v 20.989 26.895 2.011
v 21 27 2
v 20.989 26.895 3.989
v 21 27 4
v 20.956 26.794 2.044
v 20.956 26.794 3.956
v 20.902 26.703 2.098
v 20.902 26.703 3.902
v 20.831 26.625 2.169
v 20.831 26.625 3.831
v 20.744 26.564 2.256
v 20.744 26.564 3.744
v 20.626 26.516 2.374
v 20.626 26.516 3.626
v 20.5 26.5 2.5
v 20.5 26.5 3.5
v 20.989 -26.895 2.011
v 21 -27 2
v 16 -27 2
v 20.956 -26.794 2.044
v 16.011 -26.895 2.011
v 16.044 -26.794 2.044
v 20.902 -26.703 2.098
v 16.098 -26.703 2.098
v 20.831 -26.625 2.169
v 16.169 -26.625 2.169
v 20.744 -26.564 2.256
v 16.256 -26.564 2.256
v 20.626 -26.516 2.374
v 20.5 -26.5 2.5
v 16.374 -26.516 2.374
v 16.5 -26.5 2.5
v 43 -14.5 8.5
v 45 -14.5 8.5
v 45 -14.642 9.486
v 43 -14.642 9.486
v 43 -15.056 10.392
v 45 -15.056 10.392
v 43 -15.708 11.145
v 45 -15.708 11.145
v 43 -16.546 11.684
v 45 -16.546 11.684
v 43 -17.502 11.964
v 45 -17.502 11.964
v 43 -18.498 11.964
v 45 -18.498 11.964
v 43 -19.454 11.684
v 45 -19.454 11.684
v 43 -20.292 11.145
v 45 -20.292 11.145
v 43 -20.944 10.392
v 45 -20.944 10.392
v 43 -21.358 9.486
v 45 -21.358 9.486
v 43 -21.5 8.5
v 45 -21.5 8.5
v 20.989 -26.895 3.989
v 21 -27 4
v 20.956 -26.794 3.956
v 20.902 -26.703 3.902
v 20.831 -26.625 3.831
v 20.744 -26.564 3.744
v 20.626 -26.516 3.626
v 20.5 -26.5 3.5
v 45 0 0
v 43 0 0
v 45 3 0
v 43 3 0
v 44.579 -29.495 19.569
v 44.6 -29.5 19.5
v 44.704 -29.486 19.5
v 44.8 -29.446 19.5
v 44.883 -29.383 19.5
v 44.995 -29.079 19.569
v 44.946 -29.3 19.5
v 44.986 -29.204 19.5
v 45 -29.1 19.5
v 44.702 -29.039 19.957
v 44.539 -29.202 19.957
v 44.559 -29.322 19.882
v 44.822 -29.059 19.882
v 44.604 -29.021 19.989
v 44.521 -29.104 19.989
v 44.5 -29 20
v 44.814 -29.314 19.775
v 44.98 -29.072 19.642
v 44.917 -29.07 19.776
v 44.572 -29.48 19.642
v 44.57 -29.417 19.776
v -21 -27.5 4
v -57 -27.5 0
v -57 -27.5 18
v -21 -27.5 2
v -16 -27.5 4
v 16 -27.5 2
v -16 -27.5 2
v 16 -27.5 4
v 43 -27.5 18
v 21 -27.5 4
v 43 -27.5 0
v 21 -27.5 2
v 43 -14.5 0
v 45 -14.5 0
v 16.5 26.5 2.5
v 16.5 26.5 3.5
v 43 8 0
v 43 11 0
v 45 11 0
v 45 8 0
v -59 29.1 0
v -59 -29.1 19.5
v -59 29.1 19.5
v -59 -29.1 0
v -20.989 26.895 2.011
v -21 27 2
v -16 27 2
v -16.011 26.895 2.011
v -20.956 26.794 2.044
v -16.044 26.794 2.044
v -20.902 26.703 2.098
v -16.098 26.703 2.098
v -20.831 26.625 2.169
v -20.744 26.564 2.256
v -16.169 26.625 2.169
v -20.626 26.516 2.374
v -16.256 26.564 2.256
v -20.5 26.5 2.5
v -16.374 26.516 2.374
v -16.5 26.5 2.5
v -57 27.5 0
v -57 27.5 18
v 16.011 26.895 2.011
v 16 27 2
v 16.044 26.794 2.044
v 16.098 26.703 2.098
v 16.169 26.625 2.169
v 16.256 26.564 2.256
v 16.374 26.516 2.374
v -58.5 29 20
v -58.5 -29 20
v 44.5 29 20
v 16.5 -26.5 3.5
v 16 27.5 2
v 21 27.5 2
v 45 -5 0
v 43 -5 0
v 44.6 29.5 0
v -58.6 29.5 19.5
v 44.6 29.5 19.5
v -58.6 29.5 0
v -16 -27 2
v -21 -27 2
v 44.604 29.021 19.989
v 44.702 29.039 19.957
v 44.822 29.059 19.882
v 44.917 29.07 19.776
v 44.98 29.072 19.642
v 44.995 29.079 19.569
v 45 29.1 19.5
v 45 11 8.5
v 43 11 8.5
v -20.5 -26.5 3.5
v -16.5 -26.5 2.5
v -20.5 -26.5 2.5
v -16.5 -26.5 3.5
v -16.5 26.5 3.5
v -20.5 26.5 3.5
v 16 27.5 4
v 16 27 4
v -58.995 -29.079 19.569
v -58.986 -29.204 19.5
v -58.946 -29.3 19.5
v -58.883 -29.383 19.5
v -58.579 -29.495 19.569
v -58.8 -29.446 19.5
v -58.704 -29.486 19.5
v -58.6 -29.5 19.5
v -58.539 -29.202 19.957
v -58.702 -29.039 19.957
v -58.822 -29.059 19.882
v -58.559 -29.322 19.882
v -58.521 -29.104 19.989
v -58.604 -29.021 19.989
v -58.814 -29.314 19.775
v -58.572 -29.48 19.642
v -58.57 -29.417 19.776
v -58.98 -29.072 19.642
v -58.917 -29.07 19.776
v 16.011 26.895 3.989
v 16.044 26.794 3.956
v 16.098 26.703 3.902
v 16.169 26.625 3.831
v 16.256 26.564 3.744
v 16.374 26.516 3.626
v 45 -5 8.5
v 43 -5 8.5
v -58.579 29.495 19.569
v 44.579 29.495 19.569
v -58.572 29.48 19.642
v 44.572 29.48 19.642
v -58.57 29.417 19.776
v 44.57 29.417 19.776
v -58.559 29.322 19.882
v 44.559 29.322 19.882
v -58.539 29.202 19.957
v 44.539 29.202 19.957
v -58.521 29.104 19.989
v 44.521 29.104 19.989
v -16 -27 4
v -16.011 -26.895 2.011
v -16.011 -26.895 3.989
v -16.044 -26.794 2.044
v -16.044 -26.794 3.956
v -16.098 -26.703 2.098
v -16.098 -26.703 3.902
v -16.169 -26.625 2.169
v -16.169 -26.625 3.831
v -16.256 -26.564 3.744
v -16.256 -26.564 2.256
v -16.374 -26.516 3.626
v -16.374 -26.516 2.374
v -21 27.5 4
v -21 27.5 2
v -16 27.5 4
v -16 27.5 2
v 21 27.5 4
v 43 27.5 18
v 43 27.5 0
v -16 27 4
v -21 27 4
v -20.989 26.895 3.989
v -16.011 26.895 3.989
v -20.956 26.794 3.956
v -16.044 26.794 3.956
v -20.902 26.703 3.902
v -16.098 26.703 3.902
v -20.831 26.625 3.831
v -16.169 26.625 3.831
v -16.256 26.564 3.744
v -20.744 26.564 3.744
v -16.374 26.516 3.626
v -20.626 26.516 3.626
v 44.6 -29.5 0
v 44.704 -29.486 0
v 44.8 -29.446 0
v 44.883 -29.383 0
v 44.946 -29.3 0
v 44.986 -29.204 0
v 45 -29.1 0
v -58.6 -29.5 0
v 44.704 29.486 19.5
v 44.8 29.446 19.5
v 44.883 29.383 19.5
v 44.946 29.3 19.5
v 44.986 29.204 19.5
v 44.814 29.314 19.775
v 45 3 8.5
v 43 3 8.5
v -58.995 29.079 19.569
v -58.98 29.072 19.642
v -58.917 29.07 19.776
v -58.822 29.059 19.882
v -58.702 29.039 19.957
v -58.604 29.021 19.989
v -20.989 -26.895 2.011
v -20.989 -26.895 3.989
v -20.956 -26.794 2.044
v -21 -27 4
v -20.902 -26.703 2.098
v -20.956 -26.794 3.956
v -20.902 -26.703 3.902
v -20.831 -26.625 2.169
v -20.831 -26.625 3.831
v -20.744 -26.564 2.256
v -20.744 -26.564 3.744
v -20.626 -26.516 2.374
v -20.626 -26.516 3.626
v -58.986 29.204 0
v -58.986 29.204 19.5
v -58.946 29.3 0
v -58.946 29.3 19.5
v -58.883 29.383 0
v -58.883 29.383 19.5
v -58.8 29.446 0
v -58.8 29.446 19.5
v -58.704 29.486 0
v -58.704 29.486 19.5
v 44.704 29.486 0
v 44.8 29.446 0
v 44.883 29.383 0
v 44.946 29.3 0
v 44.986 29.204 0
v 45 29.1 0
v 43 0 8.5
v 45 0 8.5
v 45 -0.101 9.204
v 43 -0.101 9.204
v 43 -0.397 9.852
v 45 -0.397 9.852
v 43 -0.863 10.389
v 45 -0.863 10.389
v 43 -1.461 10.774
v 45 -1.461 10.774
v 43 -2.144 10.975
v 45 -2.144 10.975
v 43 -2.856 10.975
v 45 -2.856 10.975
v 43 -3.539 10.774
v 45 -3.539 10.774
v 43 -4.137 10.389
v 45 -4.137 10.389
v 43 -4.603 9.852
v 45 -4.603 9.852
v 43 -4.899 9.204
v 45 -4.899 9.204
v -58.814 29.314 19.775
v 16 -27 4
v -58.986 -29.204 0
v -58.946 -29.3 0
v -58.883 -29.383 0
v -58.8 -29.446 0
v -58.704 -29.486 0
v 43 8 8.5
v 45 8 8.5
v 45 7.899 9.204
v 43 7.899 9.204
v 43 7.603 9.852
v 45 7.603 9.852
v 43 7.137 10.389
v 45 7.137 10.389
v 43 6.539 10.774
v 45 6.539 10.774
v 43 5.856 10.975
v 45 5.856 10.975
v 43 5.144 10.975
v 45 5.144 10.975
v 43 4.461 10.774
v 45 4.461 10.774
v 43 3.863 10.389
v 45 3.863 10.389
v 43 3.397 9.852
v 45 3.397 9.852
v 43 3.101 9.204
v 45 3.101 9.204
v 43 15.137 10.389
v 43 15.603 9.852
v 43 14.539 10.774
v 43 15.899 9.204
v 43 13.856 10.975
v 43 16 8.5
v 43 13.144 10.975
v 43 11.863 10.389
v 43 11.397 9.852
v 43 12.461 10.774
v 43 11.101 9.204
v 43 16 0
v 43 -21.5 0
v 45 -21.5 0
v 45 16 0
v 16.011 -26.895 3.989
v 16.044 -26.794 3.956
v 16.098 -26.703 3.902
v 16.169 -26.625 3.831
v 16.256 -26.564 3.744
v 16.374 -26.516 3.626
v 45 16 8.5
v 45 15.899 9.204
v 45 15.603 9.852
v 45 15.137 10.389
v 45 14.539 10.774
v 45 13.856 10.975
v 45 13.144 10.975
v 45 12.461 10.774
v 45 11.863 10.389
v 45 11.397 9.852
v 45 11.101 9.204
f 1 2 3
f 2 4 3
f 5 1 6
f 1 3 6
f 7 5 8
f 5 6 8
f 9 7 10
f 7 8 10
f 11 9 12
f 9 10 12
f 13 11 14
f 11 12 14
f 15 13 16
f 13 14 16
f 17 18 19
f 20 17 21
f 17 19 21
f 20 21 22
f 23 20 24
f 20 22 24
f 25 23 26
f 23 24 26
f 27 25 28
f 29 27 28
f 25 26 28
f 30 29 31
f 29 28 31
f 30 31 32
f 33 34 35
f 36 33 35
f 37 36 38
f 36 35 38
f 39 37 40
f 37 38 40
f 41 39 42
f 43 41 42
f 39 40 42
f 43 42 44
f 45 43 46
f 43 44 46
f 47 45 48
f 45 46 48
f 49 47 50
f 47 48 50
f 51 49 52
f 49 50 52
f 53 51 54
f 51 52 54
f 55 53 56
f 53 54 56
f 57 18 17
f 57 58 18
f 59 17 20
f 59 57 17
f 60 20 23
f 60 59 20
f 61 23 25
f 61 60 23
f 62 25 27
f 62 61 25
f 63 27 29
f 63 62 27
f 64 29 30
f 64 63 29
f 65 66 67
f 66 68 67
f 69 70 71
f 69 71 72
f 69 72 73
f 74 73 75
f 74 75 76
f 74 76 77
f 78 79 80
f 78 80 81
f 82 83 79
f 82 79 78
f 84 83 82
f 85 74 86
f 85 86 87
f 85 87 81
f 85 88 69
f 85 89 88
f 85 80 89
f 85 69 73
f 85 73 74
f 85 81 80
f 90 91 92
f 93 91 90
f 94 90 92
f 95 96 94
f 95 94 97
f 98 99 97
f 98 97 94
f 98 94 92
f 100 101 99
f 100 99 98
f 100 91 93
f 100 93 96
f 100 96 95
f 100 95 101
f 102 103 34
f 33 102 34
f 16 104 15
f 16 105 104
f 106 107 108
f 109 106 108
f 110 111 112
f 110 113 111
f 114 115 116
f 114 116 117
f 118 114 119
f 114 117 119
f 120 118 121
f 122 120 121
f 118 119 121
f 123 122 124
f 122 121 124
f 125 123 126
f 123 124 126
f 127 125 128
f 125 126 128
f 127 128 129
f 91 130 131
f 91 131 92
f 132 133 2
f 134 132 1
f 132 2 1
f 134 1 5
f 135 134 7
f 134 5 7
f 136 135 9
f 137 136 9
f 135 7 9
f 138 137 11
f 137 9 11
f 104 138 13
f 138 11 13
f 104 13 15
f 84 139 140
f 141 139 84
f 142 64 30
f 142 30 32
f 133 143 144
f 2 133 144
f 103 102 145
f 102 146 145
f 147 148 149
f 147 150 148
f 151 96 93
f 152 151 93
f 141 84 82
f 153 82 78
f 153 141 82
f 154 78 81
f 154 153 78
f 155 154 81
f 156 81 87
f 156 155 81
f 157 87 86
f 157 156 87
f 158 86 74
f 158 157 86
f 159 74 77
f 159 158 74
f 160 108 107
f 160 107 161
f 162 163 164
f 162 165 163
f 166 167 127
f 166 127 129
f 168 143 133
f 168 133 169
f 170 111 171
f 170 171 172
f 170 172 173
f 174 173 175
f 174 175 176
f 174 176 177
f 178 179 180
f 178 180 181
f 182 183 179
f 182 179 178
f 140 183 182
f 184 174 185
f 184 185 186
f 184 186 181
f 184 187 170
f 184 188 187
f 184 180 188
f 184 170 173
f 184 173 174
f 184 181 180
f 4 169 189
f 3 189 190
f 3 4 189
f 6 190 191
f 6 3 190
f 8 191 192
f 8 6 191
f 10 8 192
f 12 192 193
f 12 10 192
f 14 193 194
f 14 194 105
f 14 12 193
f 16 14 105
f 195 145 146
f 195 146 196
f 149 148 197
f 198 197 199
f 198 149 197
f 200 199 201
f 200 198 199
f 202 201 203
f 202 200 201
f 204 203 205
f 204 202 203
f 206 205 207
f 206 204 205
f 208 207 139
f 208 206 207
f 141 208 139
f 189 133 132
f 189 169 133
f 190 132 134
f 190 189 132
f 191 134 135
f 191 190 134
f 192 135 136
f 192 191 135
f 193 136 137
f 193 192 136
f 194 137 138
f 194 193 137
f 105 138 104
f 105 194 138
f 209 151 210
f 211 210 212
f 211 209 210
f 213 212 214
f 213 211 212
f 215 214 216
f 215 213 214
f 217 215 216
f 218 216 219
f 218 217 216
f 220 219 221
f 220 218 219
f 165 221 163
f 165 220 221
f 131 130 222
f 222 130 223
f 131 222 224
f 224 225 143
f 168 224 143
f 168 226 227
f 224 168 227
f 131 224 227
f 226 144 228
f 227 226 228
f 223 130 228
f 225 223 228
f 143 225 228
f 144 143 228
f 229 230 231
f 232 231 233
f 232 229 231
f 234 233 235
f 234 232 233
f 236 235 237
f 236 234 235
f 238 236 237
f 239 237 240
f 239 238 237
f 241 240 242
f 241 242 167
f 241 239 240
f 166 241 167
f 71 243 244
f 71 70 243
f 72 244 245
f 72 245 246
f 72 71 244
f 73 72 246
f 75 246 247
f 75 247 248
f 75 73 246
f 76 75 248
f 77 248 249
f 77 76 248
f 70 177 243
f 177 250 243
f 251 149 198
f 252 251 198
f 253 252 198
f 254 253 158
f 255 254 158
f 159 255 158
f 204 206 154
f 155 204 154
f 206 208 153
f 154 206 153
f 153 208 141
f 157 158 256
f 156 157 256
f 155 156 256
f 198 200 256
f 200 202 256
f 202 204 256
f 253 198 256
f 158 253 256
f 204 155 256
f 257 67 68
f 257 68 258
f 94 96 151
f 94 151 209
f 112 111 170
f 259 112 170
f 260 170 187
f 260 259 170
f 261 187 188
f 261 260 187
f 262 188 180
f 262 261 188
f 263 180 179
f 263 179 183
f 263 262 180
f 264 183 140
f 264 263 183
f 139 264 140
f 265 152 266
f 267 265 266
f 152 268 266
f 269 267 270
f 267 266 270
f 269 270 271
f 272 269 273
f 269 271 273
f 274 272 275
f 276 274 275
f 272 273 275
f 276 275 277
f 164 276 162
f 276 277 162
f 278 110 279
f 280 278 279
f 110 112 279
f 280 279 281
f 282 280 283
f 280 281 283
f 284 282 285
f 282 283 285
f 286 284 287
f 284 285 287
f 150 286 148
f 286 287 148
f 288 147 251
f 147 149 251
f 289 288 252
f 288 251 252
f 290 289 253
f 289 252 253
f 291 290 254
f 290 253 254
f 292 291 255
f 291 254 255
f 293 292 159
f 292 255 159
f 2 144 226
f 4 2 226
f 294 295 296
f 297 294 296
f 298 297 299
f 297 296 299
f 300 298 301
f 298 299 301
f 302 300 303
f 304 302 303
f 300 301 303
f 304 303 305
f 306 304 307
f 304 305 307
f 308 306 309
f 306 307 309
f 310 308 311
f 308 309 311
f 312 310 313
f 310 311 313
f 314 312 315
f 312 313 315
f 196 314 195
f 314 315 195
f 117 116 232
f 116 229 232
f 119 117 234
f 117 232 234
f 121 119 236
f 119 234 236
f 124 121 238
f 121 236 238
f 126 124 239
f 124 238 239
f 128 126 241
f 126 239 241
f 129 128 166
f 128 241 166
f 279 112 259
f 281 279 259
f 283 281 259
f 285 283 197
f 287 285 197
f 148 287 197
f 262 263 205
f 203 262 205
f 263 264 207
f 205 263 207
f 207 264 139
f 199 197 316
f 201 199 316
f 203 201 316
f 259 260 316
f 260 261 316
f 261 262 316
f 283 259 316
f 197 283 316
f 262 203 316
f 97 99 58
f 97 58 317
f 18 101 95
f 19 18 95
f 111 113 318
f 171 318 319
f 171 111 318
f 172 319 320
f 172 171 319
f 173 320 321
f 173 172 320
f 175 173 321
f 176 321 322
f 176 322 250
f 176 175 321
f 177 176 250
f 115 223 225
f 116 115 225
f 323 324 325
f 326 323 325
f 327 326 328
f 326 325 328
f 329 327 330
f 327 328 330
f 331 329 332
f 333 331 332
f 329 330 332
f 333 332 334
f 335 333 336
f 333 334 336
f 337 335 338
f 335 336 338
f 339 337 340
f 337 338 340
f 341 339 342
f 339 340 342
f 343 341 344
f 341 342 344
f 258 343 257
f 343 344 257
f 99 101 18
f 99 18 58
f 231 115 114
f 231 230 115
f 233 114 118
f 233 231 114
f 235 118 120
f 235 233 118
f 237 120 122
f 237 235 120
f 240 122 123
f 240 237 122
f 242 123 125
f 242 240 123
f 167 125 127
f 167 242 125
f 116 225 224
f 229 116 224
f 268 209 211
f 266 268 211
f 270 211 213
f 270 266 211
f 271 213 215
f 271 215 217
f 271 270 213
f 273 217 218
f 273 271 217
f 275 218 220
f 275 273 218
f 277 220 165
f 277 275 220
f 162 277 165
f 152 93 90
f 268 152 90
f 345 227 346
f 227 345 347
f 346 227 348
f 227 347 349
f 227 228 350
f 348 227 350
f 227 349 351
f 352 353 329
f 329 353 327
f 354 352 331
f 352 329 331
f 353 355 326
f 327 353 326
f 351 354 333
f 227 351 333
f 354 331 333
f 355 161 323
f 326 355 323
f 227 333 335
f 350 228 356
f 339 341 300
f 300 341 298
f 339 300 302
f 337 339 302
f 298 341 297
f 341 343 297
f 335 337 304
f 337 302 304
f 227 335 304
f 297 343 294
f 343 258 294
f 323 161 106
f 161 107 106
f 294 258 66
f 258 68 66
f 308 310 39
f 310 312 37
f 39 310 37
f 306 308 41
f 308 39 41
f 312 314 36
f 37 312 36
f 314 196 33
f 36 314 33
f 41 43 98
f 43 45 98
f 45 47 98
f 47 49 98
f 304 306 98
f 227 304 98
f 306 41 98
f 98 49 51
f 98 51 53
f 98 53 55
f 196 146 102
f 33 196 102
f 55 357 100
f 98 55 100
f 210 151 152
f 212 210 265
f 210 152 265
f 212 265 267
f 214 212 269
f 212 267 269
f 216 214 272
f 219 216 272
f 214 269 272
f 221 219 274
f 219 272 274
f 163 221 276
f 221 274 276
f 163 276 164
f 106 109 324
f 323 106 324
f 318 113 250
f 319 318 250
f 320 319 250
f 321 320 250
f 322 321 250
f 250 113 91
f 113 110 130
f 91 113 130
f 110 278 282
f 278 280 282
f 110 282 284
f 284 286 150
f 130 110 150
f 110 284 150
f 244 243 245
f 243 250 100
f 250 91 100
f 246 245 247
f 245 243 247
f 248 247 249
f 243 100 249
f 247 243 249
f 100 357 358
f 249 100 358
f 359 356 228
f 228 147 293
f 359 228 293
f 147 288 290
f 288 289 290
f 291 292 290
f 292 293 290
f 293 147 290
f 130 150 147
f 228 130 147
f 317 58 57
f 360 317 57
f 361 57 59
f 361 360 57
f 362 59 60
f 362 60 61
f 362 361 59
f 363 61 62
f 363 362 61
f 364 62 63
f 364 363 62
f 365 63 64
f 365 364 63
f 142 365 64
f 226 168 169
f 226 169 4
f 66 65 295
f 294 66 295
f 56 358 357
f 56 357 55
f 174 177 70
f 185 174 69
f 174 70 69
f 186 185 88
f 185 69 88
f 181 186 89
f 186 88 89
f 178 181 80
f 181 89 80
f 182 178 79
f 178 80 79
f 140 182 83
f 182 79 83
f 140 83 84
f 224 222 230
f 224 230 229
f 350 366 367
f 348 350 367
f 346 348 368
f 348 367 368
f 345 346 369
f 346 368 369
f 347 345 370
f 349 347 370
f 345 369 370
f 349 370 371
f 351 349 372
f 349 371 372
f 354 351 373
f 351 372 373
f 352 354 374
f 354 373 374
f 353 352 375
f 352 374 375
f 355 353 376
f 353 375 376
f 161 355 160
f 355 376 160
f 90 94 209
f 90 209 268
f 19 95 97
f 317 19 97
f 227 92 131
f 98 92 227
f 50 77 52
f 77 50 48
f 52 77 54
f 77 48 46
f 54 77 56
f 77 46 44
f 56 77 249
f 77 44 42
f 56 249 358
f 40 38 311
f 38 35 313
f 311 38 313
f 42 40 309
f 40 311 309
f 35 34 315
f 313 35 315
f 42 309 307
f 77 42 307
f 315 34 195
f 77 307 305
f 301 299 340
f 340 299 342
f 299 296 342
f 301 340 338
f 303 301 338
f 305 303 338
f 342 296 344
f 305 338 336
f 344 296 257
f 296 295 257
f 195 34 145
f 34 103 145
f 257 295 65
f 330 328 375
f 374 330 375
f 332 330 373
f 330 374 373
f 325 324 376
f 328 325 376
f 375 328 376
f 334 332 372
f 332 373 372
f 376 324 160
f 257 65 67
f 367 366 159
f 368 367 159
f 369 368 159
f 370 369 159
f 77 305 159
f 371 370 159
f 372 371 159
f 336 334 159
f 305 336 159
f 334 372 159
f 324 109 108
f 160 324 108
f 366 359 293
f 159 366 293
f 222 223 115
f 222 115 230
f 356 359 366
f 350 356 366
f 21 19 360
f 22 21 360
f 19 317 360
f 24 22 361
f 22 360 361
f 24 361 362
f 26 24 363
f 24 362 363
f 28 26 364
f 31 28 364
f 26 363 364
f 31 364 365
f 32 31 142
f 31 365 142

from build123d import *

# Parameters (mm, degrees)
SKETCH_W        = 104
SKETCH_H        = 59
PAD_DEPTH       = 20
SKETCH002_W     = 100
SKETCH002_H     = 55
POCKET_DEPTH    = 18
SKETCH003_W     = 5
SKETCH003_H     = 2
PAD001_DEPTH    = 1
SKETCH004_W     = 5
SKETCH004_H     = 2
PAD002_DEPTH    = 1
POCKET001_DEPTH = 2
FILLET_R        = 0.5
FILLET001_R     = 0.4
FILLET002_R     = 0.5
FILLET003_R     = 0.5


with BuildPart() as part:
    # Sketch → Pad (new body)
    with BuildSketch(Plane.XY):
        with Locations((-7, 0)):
            Rectangle(SKETCH_W, SKETCH_H)
    extrude(amount=PAD_DEPTH)

    # Sketch002 (on Face5 of Pad) → Pocket (cut)
    with BuildSketch(Plane(origin=(0, 0, 0), x_dir=(1, 0, 0), z_dir=(0, 0, -1))):
        with Locations((-7, 0)):
            Rectangle(SKETCH002_W, SKETCH002_H)
    extrude(amount=-POCKET_DEPTH, mode=Mode.SUBTRACT)

    # Sketch003 (on Face8 of Pocket) → Pad001 (join)
    with BuildSketch(Plane.XZ.offset(-27.5)):
        with Locations((-18.5, 3)):
            Rectangle(SKETCH003_W, SKETCH003_H)
        with Locations((18.5, 3)):
            Rectangle(SKETCH003_W, SKETCH003_H)
    extrude(amount=PAD001_DEPTH)

    # Sketch004 (on Face10 of Pad001) → Pad002 (join)
    with BuildSketch(Plane(origin=(0, -27.5, 0), x_dir=(-1, 0, 0), z_dir=(0, 1, 0))):
        with Locations((-18.5, 3)):
            Rectangle(SKETCH004_W, SKETCH004_H)
        with Locations((18.5, 3)):
            Rectangle(SKETCH004_W, SKETCH004_H)
    extrude(amount=PAD002_DEPTH)

    # Sketch005 (on Face3 of Pad002) → Pocket001 (cut)
    with BuildSketch(Plane.YZ.offset(45)):
        with BuildLine():
            ThreePointArc((-21.5, 0), (-18, -3.5), (-14.5, 0))
            Line((-14.5, 0), (-14.5, 8.5))
            ThreePointArc((-14.5, 8.5), (-18, 12), (-21.5, 8.5))
            Line((-21.5, 0), (-21.5, 8.5))
        make_face()
        with BuildLine():
            ThreePointArc((-5, 0), (-2.5, -2.5), (0, 0))
            Line((0, 0), (0, 8.5))
            ThreePointArc((0, 8.5), (-2.5, 11), (-5, 8.5))
            Line((-5, 0), (-5, 8.5))
        make_face()
        with BuildLine():
            ThreePointArc((3, 0), (5.5, -2.5), (8, 0))
            Line((8, 0), (8, 8.5))
            ThreePointArc((8, 8.5), (5.5, 11), (3, 8.5))
            Line((3, 0), (3, 8.5))
        make_face()
        with BuildLine():
            ThreePointArc((11, 0), (13.5, -2.5), (16, 0))
            Line((16, 0), (16, 8.5))
            ThreePointArc((16, 8.5), (13.5, 11), (11, 8.5))
            Line((11, 0), (11, 8.5))
        make_face()
    extrude(amount=-POCKET001_DEPTH, mode=Mode.SUBTRACT)

    # Fillet
    fillet_edges = [part.edges().sort_by_distance(p)[0] for p in [
        (-7, 29.5, 20),
        (-59, 0, 20),
        (-7, -29.5, 20),
        (45, 0, 20),
    ]]
    fillet(fillet_edges, radius=FILLET_R)

    # Fillet001
    fillet001_edges = [part.edges().sort_by_distance(p)[0] for p in [
        (45, 29.5, 9.75),
        (45, -29.5, 9.75),
        (-59, 29.5, 9.75),
        (-59, -29.5, 9.75),
    ]]
    fillet(fillet001_edges, radius=FILLET001_R)

    # Fillet002
    fillet002_edges = [part.edges().sort_by_distance(p)[0] for p in [
        (-18.5, -26.5, 2),
        (-21, -26.5, 3),
        (-18.5, -26.5, 4),
        (-16, -26.5, 3),
        (16, -26.5, 3),
        (18.5, -26.5, 2),
        (21, -26.5, 3),
        (18.5, -26.5, 4),
    ]]
    fillet(fillet002_edges, radius=FILLET002_R)

    # Fillet003
    fillet003_edges = [part.edges().sort_by_distance(p)[0] for p in [
        (-21, 26.5, 3),
        (-18.5, 26.5, 4),
        (-18.5, 26.5, 2),
        (-16, 26.5, 3),
        (18.5, 26.5, 2),
        (16, 26.5, 3),
        (18.5, 26.5, 4),
        (21, 26.5, 3),
    ]]
    fillet(fillet003_edges, radius=FILLET003_R)


solid = part.part
